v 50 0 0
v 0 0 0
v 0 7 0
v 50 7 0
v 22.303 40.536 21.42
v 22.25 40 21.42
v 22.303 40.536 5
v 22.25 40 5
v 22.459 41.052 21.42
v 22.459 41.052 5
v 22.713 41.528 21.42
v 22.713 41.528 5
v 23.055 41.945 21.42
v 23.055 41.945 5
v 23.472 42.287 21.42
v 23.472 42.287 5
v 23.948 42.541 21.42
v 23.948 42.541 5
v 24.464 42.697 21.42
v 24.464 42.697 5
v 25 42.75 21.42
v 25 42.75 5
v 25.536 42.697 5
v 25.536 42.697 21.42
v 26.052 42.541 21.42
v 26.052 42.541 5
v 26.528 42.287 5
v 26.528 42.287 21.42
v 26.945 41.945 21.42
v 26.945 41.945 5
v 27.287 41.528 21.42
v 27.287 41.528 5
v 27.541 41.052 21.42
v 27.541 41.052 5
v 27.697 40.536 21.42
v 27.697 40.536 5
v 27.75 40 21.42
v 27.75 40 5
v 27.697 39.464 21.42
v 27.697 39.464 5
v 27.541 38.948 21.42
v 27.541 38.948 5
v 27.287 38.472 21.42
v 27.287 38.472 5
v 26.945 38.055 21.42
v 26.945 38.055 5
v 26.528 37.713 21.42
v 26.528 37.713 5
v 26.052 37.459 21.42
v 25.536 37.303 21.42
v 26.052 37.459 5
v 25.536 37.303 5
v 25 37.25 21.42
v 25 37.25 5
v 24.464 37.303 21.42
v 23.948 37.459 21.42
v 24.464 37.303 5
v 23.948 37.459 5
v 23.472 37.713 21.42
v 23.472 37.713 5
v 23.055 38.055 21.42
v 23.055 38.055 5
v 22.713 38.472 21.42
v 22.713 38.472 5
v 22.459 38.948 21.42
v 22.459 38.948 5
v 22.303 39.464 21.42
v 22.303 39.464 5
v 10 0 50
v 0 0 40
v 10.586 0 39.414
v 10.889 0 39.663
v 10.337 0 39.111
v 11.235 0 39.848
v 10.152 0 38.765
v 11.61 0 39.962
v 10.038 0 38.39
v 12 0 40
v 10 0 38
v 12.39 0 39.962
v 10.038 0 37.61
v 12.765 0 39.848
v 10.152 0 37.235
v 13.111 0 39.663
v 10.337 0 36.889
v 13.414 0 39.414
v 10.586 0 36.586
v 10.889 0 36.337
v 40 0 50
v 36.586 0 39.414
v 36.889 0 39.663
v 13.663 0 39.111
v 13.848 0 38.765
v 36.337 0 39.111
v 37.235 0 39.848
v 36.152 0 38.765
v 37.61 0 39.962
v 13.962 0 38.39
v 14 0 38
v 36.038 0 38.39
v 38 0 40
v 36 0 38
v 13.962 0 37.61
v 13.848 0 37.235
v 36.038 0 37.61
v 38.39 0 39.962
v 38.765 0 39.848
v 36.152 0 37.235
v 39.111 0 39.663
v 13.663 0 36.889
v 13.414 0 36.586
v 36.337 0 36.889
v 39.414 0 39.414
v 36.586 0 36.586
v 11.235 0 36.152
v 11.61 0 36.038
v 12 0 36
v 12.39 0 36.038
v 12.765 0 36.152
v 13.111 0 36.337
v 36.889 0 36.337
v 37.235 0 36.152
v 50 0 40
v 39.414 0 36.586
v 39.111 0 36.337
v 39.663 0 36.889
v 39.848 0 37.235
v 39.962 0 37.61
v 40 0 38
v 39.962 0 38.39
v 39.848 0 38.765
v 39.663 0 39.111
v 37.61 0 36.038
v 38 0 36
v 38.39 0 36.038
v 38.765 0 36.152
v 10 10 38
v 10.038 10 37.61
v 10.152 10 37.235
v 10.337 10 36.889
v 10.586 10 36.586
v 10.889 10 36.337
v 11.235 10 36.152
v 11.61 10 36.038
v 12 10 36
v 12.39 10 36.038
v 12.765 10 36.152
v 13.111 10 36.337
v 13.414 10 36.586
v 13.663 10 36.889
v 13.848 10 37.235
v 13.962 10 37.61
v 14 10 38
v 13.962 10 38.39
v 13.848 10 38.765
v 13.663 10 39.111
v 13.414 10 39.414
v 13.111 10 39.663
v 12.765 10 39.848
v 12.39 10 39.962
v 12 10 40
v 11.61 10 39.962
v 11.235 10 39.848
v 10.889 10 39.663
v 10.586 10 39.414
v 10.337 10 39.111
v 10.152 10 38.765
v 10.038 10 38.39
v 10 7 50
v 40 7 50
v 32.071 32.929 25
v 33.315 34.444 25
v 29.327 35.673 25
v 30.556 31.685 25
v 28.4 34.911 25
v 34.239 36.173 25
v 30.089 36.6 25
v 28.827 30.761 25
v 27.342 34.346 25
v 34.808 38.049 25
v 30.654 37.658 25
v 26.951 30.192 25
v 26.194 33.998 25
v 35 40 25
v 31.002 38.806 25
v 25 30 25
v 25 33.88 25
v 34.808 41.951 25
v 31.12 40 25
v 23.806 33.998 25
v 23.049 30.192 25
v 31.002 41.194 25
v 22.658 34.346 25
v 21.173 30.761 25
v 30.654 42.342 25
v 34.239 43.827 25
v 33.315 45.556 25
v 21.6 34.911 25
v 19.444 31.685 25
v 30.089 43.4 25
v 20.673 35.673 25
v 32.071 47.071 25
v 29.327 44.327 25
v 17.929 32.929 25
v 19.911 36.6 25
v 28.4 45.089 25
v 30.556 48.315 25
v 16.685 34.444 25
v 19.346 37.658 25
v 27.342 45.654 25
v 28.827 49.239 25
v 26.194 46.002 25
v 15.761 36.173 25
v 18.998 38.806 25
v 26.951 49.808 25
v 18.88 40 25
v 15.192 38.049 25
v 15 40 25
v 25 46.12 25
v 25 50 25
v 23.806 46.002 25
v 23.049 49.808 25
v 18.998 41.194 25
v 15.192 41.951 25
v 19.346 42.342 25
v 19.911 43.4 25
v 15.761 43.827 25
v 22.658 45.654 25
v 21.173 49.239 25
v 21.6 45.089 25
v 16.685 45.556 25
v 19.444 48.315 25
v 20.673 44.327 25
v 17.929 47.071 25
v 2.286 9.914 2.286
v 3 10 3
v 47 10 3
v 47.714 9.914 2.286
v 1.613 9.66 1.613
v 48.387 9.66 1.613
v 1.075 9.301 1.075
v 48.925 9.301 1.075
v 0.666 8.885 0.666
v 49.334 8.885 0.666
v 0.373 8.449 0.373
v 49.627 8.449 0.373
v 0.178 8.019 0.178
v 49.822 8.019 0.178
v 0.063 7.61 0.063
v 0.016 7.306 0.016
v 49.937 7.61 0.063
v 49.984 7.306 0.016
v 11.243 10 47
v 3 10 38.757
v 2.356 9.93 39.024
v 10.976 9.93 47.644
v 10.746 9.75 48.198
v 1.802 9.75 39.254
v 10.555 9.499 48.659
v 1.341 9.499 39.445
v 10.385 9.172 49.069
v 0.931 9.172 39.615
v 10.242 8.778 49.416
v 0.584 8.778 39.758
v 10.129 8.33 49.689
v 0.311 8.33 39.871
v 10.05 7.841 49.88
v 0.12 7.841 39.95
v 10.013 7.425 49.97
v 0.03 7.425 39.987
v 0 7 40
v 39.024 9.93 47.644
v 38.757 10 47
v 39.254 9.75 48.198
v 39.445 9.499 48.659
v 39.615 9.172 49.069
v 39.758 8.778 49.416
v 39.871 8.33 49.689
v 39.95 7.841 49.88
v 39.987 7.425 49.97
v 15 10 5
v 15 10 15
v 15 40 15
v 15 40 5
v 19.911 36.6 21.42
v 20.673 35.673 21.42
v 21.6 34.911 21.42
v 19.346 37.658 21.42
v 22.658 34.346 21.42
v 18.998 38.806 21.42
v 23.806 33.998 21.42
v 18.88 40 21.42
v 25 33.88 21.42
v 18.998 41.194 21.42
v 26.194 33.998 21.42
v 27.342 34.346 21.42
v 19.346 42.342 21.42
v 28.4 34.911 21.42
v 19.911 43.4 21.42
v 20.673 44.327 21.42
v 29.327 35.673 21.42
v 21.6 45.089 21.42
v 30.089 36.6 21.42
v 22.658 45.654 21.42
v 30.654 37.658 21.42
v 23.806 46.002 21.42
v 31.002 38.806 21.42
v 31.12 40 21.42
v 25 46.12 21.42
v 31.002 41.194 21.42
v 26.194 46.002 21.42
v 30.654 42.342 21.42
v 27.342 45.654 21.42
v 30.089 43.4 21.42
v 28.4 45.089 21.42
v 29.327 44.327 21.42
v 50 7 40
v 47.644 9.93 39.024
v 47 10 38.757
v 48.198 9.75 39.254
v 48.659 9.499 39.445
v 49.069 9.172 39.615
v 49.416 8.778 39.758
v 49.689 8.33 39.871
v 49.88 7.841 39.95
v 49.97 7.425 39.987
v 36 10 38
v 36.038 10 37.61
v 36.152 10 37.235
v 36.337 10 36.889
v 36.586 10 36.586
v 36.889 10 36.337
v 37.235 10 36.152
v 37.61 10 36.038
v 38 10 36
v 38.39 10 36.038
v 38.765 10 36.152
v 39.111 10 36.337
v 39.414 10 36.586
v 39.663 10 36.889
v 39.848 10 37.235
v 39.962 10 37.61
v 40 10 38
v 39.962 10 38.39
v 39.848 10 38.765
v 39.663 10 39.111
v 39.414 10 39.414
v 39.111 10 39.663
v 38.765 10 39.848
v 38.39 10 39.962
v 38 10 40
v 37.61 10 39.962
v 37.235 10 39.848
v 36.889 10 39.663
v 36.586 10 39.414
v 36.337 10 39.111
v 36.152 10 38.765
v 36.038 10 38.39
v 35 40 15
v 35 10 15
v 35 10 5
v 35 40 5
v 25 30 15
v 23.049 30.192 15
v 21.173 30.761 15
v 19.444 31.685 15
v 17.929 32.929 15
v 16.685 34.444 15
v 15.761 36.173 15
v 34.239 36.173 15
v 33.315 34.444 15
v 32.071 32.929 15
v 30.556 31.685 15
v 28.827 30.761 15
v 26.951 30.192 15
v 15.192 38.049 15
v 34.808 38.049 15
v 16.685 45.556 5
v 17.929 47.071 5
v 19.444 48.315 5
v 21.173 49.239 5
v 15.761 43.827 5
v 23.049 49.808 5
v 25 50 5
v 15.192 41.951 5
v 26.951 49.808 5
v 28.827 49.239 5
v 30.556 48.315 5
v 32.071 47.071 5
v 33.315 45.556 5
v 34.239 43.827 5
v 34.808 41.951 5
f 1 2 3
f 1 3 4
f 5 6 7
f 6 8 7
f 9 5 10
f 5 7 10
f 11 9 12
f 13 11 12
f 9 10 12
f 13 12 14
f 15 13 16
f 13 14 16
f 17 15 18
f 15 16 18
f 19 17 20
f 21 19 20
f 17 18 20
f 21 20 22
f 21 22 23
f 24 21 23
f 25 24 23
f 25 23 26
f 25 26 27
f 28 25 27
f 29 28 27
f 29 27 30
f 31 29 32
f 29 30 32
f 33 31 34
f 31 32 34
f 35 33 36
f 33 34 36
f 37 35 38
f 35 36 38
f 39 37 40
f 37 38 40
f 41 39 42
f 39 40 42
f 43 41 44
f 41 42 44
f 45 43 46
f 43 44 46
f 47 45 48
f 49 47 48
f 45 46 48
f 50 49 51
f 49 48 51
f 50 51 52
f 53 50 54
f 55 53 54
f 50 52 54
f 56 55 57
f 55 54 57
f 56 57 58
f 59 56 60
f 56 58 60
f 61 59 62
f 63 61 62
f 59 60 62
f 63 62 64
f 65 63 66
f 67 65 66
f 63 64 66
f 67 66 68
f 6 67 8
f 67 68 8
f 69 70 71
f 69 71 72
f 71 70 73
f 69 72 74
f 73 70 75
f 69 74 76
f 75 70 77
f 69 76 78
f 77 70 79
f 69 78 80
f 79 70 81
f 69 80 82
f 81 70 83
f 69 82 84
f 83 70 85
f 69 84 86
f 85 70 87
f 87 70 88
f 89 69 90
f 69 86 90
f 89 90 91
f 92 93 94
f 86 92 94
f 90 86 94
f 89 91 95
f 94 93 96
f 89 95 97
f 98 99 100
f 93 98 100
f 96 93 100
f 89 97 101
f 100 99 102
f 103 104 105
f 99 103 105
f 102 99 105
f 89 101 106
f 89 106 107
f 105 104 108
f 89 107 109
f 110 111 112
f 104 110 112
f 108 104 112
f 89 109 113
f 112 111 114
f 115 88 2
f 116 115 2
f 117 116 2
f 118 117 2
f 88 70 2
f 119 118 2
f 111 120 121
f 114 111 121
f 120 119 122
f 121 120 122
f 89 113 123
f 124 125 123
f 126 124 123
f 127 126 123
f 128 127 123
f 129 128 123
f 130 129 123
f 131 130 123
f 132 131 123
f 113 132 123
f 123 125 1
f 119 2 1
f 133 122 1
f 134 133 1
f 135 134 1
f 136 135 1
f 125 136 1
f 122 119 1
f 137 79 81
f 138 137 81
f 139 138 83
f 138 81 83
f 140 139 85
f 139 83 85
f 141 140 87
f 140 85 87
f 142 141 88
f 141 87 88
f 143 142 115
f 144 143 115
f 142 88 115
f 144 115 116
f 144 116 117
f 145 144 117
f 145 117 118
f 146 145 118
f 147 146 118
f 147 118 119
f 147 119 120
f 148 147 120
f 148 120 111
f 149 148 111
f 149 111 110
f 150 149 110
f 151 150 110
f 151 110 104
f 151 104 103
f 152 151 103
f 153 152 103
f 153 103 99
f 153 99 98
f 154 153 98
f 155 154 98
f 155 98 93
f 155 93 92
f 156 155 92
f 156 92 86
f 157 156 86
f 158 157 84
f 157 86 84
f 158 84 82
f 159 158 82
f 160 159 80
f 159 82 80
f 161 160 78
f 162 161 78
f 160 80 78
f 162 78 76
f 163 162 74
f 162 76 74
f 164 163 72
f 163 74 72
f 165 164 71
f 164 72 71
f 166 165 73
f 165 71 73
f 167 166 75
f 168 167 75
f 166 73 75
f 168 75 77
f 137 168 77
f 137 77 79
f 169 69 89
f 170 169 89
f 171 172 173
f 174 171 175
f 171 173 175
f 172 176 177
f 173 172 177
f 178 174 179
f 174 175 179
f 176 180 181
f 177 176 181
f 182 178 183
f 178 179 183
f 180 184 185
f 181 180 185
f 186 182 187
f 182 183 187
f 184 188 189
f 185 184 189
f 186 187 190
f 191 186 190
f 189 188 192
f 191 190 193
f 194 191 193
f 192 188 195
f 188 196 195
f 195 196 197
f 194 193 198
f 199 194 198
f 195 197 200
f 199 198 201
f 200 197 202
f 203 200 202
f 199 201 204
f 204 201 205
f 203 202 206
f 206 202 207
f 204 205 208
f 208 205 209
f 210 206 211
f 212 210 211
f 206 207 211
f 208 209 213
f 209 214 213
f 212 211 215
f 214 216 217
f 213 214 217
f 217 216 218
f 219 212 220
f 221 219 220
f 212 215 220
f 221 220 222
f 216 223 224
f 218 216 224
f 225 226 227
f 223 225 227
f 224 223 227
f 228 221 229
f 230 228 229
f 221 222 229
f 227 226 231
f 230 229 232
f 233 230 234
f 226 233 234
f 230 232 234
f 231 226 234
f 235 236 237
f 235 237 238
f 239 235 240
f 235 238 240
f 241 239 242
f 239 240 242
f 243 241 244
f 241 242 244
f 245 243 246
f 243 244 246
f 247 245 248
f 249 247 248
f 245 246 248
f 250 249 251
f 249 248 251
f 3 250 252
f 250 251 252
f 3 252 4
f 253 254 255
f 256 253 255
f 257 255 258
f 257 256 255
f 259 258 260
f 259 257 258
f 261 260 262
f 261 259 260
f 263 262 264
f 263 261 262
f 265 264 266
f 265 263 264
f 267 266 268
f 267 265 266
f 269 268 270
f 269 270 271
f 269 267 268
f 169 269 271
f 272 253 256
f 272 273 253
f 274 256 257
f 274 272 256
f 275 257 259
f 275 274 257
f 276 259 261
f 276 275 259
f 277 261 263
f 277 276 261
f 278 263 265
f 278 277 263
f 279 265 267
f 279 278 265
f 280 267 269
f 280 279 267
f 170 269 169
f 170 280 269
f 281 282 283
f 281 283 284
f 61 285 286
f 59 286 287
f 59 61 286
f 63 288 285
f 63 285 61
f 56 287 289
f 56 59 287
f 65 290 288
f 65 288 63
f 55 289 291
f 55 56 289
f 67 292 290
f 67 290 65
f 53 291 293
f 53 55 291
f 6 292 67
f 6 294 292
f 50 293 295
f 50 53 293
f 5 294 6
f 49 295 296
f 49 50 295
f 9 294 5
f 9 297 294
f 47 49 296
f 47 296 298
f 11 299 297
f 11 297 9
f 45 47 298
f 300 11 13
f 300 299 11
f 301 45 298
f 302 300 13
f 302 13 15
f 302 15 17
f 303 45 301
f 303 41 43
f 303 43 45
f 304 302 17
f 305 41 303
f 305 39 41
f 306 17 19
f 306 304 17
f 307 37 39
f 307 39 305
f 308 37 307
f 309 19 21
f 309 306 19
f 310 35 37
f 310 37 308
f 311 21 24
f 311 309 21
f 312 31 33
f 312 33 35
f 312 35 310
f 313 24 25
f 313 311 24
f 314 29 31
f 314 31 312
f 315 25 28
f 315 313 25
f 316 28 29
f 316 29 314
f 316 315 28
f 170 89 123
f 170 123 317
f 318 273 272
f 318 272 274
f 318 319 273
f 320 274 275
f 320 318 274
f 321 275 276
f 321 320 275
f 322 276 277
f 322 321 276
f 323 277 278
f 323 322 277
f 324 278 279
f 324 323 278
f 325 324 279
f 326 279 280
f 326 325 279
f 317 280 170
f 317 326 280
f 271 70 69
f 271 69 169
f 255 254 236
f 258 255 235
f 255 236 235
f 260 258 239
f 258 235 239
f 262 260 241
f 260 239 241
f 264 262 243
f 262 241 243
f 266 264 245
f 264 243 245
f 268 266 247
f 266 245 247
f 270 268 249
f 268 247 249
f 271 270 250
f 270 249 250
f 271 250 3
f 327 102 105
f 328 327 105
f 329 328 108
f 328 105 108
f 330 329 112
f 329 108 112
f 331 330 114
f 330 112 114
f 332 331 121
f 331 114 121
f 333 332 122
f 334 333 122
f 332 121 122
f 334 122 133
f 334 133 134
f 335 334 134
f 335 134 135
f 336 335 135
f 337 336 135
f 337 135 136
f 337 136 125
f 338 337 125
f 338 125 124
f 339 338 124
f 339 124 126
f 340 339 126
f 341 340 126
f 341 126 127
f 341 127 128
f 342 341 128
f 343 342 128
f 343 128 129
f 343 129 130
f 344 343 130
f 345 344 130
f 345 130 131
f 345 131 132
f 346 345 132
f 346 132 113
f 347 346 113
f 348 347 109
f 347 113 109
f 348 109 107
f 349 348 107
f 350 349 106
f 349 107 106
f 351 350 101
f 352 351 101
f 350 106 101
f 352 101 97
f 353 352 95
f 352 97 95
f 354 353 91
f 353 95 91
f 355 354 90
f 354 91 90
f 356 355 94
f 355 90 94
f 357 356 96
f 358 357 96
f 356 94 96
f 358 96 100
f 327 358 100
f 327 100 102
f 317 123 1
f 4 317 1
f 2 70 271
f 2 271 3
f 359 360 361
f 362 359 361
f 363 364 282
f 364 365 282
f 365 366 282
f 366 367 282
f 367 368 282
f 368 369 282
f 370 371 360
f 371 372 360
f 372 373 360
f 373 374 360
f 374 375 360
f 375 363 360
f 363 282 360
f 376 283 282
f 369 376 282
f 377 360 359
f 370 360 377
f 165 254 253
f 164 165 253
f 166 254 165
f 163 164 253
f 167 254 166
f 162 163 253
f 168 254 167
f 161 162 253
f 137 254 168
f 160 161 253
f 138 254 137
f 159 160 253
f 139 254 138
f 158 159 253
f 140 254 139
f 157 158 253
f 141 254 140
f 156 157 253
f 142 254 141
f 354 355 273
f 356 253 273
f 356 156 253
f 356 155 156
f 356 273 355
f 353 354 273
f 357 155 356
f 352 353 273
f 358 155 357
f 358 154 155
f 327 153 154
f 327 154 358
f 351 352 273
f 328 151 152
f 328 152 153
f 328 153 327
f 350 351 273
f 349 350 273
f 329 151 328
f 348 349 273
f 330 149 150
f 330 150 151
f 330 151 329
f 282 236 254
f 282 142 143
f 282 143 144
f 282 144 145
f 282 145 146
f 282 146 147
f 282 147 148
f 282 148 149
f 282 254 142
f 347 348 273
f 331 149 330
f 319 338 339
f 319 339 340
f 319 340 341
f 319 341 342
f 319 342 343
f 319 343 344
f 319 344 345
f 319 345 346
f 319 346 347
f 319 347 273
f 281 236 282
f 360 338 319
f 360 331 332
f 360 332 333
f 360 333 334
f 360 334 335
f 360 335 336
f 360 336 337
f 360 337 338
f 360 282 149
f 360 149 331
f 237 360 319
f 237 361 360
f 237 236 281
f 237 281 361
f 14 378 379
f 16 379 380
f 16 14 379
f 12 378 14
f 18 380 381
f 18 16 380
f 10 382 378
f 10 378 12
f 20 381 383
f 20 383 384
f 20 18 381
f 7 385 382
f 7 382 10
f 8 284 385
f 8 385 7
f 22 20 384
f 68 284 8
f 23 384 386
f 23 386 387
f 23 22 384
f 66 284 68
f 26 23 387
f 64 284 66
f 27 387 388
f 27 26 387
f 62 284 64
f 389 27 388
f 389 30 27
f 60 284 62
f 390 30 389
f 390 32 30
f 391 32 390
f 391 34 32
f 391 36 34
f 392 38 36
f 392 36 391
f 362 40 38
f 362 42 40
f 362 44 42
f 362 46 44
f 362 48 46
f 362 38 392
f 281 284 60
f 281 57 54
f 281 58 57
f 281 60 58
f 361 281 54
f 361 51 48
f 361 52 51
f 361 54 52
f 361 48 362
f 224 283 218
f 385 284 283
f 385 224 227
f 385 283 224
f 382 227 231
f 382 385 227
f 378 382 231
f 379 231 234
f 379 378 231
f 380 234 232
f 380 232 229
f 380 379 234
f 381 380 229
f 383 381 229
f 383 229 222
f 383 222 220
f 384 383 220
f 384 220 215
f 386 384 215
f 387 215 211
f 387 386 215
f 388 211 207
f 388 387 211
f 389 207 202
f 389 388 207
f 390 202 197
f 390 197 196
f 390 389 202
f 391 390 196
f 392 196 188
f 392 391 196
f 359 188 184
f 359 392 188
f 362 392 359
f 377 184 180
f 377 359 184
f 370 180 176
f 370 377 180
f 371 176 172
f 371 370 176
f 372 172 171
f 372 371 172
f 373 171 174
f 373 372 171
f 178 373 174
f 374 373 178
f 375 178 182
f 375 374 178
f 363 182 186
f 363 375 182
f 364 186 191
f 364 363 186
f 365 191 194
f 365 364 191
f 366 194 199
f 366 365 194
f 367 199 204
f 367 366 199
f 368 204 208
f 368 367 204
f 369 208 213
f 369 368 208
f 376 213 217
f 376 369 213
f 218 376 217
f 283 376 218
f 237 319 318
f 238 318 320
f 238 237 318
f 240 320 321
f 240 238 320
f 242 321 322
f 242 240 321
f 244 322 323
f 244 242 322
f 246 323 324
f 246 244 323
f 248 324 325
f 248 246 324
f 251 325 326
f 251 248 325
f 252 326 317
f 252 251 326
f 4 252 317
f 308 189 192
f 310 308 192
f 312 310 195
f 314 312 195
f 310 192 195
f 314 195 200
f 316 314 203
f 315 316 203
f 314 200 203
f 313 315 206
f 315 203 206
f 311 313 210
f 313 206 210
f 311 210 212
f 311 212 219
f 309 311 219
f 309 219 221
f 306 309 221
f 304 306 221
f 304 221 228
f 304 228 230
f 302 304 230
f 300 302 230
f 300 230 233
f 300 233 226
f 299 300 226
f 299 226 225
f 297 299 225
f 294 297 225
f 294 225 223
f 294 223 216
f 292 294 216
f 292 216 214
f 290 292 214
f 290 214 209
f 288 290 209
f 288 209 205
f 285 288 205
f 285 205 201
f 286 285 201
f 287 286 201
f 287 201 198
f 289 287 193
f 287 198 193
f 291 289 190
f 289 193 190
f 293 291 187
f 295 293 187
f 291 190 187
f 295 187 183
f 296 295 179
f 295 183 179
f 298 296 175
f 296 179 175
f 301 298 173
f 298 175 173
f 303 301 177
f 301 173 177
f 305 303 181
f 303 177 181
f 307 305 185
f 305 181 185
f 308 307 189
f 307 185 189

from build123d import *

# Parameters (mm, degrees)
SKETCH1_W                               = 50
SKETCH1_H                               = 50
BOSS_EXTRUDE1_DEPTH                     = 10
SKETCH2_W                               = 20
SKETCH2_H                               = 10
BOSS_EXTRUDE2_DEPTH                     = 30
SKETCH3_R                               = 10
BOSS_EXTRUDE3_DEPTH                     = 20
CBORE_FOR_M5_HEX_HEAD_BOLT1_D           = 5.5
CBORE_FOR_M5_HEX_HEAD_BOLT1_CBORE_D     = 12.24
CBORE_FOR_M5_HEX_HEAD_BOLT1_CBORE_DEPTH = 3.58
F_4_0MM_DOWEL_HOLE1_D                   = 4
CHAMFER1_SIZE                           = 10
FILLET1_R                               = 3


with BuildPart() as part:
    # Sketch1 → Boss-Extrude1 (new body)
    with BuildSketch(Plane(origin=(0, 0, 0), x_dir=(1, 0, 0), z_dir=(0, 1, 0))):
        with Locations((25, -25)):
            Rectangle(SKETCH1_W, SKETCH1_H)
    extrude(amount=BOSS_EXTRUDE1_DEPTH)

    # Sketch2 → Boss-Extrude2 (add)
    with BuildSketch(Plane(origin=(0, 10, 0), x_dir=(1, 0, 0), z_dir=(0, 1, 0))):
        with Locations((25, -10)):
            Rectangle(SKETCH2_W, SKETCH2_H)
    extrude(amount=BOSS_EXTRUDE2_DEPTH)

    # Sketch3 → Boss-Extrude3 (add)
    with BuildSketch(Plane(origin=(0, 0, 5), x_dir=(-1, 0, 0), z_dir=(0, 0, -1))):
        with Locations((-25, 40)):
            Circle(SKETCH3_R)
    extrude(amount=-BOSS_EXTRUDE3_DEPTH)

    # CBORE for M5 Hex Head Bolt1 (through all)
    with Locations(Plane.XY.offset(25)):
        with Locations((25, 40)):
            CounterBoreHole(CBORE_FOR_M5_HEX_HEAD_BOLT1_D / 2, CBORE_FOR_M5_HEX_HEAD_BOLT1_CBORE_D / 2, CBORE_FOR_M5_HEX_HEAD_BOLT1_CBORE_DEPTH)

    # Ø4.0mm Dowel Hole1 (through all)
    with Locations(Plane(origin=(0, 10, 0), x_dir=(1, 0, 0), z_dir=(0, 1, 0))):
        with Locations((12, -38), (38, -38)):
            Hole(F_4_0MM_DOWEL_HOLE1_D / 2)

    # Chamfer1
    chamfer1_edges = [part.edges().sort_by_distance(p)[0] for p in [
        (50, 5, 50),
        (0, 5, 50),
    ]]
    chamfer(chamfer1_edges, length=CHAMFER1_SIZE)

    # Fillet1
    fillet1_edges = [part.edges().sort_by_distance(p)[0] for p in [
        (25, 10, 0),
        (0, 10, 20),
        (50, 10, 20),
        (25, 10, 50),
        (5, 10, 45),
        (45, 10, 45),
    ]]
    fillet(fillet1_edges, radius=FILLET1_R)


solid = part.part
